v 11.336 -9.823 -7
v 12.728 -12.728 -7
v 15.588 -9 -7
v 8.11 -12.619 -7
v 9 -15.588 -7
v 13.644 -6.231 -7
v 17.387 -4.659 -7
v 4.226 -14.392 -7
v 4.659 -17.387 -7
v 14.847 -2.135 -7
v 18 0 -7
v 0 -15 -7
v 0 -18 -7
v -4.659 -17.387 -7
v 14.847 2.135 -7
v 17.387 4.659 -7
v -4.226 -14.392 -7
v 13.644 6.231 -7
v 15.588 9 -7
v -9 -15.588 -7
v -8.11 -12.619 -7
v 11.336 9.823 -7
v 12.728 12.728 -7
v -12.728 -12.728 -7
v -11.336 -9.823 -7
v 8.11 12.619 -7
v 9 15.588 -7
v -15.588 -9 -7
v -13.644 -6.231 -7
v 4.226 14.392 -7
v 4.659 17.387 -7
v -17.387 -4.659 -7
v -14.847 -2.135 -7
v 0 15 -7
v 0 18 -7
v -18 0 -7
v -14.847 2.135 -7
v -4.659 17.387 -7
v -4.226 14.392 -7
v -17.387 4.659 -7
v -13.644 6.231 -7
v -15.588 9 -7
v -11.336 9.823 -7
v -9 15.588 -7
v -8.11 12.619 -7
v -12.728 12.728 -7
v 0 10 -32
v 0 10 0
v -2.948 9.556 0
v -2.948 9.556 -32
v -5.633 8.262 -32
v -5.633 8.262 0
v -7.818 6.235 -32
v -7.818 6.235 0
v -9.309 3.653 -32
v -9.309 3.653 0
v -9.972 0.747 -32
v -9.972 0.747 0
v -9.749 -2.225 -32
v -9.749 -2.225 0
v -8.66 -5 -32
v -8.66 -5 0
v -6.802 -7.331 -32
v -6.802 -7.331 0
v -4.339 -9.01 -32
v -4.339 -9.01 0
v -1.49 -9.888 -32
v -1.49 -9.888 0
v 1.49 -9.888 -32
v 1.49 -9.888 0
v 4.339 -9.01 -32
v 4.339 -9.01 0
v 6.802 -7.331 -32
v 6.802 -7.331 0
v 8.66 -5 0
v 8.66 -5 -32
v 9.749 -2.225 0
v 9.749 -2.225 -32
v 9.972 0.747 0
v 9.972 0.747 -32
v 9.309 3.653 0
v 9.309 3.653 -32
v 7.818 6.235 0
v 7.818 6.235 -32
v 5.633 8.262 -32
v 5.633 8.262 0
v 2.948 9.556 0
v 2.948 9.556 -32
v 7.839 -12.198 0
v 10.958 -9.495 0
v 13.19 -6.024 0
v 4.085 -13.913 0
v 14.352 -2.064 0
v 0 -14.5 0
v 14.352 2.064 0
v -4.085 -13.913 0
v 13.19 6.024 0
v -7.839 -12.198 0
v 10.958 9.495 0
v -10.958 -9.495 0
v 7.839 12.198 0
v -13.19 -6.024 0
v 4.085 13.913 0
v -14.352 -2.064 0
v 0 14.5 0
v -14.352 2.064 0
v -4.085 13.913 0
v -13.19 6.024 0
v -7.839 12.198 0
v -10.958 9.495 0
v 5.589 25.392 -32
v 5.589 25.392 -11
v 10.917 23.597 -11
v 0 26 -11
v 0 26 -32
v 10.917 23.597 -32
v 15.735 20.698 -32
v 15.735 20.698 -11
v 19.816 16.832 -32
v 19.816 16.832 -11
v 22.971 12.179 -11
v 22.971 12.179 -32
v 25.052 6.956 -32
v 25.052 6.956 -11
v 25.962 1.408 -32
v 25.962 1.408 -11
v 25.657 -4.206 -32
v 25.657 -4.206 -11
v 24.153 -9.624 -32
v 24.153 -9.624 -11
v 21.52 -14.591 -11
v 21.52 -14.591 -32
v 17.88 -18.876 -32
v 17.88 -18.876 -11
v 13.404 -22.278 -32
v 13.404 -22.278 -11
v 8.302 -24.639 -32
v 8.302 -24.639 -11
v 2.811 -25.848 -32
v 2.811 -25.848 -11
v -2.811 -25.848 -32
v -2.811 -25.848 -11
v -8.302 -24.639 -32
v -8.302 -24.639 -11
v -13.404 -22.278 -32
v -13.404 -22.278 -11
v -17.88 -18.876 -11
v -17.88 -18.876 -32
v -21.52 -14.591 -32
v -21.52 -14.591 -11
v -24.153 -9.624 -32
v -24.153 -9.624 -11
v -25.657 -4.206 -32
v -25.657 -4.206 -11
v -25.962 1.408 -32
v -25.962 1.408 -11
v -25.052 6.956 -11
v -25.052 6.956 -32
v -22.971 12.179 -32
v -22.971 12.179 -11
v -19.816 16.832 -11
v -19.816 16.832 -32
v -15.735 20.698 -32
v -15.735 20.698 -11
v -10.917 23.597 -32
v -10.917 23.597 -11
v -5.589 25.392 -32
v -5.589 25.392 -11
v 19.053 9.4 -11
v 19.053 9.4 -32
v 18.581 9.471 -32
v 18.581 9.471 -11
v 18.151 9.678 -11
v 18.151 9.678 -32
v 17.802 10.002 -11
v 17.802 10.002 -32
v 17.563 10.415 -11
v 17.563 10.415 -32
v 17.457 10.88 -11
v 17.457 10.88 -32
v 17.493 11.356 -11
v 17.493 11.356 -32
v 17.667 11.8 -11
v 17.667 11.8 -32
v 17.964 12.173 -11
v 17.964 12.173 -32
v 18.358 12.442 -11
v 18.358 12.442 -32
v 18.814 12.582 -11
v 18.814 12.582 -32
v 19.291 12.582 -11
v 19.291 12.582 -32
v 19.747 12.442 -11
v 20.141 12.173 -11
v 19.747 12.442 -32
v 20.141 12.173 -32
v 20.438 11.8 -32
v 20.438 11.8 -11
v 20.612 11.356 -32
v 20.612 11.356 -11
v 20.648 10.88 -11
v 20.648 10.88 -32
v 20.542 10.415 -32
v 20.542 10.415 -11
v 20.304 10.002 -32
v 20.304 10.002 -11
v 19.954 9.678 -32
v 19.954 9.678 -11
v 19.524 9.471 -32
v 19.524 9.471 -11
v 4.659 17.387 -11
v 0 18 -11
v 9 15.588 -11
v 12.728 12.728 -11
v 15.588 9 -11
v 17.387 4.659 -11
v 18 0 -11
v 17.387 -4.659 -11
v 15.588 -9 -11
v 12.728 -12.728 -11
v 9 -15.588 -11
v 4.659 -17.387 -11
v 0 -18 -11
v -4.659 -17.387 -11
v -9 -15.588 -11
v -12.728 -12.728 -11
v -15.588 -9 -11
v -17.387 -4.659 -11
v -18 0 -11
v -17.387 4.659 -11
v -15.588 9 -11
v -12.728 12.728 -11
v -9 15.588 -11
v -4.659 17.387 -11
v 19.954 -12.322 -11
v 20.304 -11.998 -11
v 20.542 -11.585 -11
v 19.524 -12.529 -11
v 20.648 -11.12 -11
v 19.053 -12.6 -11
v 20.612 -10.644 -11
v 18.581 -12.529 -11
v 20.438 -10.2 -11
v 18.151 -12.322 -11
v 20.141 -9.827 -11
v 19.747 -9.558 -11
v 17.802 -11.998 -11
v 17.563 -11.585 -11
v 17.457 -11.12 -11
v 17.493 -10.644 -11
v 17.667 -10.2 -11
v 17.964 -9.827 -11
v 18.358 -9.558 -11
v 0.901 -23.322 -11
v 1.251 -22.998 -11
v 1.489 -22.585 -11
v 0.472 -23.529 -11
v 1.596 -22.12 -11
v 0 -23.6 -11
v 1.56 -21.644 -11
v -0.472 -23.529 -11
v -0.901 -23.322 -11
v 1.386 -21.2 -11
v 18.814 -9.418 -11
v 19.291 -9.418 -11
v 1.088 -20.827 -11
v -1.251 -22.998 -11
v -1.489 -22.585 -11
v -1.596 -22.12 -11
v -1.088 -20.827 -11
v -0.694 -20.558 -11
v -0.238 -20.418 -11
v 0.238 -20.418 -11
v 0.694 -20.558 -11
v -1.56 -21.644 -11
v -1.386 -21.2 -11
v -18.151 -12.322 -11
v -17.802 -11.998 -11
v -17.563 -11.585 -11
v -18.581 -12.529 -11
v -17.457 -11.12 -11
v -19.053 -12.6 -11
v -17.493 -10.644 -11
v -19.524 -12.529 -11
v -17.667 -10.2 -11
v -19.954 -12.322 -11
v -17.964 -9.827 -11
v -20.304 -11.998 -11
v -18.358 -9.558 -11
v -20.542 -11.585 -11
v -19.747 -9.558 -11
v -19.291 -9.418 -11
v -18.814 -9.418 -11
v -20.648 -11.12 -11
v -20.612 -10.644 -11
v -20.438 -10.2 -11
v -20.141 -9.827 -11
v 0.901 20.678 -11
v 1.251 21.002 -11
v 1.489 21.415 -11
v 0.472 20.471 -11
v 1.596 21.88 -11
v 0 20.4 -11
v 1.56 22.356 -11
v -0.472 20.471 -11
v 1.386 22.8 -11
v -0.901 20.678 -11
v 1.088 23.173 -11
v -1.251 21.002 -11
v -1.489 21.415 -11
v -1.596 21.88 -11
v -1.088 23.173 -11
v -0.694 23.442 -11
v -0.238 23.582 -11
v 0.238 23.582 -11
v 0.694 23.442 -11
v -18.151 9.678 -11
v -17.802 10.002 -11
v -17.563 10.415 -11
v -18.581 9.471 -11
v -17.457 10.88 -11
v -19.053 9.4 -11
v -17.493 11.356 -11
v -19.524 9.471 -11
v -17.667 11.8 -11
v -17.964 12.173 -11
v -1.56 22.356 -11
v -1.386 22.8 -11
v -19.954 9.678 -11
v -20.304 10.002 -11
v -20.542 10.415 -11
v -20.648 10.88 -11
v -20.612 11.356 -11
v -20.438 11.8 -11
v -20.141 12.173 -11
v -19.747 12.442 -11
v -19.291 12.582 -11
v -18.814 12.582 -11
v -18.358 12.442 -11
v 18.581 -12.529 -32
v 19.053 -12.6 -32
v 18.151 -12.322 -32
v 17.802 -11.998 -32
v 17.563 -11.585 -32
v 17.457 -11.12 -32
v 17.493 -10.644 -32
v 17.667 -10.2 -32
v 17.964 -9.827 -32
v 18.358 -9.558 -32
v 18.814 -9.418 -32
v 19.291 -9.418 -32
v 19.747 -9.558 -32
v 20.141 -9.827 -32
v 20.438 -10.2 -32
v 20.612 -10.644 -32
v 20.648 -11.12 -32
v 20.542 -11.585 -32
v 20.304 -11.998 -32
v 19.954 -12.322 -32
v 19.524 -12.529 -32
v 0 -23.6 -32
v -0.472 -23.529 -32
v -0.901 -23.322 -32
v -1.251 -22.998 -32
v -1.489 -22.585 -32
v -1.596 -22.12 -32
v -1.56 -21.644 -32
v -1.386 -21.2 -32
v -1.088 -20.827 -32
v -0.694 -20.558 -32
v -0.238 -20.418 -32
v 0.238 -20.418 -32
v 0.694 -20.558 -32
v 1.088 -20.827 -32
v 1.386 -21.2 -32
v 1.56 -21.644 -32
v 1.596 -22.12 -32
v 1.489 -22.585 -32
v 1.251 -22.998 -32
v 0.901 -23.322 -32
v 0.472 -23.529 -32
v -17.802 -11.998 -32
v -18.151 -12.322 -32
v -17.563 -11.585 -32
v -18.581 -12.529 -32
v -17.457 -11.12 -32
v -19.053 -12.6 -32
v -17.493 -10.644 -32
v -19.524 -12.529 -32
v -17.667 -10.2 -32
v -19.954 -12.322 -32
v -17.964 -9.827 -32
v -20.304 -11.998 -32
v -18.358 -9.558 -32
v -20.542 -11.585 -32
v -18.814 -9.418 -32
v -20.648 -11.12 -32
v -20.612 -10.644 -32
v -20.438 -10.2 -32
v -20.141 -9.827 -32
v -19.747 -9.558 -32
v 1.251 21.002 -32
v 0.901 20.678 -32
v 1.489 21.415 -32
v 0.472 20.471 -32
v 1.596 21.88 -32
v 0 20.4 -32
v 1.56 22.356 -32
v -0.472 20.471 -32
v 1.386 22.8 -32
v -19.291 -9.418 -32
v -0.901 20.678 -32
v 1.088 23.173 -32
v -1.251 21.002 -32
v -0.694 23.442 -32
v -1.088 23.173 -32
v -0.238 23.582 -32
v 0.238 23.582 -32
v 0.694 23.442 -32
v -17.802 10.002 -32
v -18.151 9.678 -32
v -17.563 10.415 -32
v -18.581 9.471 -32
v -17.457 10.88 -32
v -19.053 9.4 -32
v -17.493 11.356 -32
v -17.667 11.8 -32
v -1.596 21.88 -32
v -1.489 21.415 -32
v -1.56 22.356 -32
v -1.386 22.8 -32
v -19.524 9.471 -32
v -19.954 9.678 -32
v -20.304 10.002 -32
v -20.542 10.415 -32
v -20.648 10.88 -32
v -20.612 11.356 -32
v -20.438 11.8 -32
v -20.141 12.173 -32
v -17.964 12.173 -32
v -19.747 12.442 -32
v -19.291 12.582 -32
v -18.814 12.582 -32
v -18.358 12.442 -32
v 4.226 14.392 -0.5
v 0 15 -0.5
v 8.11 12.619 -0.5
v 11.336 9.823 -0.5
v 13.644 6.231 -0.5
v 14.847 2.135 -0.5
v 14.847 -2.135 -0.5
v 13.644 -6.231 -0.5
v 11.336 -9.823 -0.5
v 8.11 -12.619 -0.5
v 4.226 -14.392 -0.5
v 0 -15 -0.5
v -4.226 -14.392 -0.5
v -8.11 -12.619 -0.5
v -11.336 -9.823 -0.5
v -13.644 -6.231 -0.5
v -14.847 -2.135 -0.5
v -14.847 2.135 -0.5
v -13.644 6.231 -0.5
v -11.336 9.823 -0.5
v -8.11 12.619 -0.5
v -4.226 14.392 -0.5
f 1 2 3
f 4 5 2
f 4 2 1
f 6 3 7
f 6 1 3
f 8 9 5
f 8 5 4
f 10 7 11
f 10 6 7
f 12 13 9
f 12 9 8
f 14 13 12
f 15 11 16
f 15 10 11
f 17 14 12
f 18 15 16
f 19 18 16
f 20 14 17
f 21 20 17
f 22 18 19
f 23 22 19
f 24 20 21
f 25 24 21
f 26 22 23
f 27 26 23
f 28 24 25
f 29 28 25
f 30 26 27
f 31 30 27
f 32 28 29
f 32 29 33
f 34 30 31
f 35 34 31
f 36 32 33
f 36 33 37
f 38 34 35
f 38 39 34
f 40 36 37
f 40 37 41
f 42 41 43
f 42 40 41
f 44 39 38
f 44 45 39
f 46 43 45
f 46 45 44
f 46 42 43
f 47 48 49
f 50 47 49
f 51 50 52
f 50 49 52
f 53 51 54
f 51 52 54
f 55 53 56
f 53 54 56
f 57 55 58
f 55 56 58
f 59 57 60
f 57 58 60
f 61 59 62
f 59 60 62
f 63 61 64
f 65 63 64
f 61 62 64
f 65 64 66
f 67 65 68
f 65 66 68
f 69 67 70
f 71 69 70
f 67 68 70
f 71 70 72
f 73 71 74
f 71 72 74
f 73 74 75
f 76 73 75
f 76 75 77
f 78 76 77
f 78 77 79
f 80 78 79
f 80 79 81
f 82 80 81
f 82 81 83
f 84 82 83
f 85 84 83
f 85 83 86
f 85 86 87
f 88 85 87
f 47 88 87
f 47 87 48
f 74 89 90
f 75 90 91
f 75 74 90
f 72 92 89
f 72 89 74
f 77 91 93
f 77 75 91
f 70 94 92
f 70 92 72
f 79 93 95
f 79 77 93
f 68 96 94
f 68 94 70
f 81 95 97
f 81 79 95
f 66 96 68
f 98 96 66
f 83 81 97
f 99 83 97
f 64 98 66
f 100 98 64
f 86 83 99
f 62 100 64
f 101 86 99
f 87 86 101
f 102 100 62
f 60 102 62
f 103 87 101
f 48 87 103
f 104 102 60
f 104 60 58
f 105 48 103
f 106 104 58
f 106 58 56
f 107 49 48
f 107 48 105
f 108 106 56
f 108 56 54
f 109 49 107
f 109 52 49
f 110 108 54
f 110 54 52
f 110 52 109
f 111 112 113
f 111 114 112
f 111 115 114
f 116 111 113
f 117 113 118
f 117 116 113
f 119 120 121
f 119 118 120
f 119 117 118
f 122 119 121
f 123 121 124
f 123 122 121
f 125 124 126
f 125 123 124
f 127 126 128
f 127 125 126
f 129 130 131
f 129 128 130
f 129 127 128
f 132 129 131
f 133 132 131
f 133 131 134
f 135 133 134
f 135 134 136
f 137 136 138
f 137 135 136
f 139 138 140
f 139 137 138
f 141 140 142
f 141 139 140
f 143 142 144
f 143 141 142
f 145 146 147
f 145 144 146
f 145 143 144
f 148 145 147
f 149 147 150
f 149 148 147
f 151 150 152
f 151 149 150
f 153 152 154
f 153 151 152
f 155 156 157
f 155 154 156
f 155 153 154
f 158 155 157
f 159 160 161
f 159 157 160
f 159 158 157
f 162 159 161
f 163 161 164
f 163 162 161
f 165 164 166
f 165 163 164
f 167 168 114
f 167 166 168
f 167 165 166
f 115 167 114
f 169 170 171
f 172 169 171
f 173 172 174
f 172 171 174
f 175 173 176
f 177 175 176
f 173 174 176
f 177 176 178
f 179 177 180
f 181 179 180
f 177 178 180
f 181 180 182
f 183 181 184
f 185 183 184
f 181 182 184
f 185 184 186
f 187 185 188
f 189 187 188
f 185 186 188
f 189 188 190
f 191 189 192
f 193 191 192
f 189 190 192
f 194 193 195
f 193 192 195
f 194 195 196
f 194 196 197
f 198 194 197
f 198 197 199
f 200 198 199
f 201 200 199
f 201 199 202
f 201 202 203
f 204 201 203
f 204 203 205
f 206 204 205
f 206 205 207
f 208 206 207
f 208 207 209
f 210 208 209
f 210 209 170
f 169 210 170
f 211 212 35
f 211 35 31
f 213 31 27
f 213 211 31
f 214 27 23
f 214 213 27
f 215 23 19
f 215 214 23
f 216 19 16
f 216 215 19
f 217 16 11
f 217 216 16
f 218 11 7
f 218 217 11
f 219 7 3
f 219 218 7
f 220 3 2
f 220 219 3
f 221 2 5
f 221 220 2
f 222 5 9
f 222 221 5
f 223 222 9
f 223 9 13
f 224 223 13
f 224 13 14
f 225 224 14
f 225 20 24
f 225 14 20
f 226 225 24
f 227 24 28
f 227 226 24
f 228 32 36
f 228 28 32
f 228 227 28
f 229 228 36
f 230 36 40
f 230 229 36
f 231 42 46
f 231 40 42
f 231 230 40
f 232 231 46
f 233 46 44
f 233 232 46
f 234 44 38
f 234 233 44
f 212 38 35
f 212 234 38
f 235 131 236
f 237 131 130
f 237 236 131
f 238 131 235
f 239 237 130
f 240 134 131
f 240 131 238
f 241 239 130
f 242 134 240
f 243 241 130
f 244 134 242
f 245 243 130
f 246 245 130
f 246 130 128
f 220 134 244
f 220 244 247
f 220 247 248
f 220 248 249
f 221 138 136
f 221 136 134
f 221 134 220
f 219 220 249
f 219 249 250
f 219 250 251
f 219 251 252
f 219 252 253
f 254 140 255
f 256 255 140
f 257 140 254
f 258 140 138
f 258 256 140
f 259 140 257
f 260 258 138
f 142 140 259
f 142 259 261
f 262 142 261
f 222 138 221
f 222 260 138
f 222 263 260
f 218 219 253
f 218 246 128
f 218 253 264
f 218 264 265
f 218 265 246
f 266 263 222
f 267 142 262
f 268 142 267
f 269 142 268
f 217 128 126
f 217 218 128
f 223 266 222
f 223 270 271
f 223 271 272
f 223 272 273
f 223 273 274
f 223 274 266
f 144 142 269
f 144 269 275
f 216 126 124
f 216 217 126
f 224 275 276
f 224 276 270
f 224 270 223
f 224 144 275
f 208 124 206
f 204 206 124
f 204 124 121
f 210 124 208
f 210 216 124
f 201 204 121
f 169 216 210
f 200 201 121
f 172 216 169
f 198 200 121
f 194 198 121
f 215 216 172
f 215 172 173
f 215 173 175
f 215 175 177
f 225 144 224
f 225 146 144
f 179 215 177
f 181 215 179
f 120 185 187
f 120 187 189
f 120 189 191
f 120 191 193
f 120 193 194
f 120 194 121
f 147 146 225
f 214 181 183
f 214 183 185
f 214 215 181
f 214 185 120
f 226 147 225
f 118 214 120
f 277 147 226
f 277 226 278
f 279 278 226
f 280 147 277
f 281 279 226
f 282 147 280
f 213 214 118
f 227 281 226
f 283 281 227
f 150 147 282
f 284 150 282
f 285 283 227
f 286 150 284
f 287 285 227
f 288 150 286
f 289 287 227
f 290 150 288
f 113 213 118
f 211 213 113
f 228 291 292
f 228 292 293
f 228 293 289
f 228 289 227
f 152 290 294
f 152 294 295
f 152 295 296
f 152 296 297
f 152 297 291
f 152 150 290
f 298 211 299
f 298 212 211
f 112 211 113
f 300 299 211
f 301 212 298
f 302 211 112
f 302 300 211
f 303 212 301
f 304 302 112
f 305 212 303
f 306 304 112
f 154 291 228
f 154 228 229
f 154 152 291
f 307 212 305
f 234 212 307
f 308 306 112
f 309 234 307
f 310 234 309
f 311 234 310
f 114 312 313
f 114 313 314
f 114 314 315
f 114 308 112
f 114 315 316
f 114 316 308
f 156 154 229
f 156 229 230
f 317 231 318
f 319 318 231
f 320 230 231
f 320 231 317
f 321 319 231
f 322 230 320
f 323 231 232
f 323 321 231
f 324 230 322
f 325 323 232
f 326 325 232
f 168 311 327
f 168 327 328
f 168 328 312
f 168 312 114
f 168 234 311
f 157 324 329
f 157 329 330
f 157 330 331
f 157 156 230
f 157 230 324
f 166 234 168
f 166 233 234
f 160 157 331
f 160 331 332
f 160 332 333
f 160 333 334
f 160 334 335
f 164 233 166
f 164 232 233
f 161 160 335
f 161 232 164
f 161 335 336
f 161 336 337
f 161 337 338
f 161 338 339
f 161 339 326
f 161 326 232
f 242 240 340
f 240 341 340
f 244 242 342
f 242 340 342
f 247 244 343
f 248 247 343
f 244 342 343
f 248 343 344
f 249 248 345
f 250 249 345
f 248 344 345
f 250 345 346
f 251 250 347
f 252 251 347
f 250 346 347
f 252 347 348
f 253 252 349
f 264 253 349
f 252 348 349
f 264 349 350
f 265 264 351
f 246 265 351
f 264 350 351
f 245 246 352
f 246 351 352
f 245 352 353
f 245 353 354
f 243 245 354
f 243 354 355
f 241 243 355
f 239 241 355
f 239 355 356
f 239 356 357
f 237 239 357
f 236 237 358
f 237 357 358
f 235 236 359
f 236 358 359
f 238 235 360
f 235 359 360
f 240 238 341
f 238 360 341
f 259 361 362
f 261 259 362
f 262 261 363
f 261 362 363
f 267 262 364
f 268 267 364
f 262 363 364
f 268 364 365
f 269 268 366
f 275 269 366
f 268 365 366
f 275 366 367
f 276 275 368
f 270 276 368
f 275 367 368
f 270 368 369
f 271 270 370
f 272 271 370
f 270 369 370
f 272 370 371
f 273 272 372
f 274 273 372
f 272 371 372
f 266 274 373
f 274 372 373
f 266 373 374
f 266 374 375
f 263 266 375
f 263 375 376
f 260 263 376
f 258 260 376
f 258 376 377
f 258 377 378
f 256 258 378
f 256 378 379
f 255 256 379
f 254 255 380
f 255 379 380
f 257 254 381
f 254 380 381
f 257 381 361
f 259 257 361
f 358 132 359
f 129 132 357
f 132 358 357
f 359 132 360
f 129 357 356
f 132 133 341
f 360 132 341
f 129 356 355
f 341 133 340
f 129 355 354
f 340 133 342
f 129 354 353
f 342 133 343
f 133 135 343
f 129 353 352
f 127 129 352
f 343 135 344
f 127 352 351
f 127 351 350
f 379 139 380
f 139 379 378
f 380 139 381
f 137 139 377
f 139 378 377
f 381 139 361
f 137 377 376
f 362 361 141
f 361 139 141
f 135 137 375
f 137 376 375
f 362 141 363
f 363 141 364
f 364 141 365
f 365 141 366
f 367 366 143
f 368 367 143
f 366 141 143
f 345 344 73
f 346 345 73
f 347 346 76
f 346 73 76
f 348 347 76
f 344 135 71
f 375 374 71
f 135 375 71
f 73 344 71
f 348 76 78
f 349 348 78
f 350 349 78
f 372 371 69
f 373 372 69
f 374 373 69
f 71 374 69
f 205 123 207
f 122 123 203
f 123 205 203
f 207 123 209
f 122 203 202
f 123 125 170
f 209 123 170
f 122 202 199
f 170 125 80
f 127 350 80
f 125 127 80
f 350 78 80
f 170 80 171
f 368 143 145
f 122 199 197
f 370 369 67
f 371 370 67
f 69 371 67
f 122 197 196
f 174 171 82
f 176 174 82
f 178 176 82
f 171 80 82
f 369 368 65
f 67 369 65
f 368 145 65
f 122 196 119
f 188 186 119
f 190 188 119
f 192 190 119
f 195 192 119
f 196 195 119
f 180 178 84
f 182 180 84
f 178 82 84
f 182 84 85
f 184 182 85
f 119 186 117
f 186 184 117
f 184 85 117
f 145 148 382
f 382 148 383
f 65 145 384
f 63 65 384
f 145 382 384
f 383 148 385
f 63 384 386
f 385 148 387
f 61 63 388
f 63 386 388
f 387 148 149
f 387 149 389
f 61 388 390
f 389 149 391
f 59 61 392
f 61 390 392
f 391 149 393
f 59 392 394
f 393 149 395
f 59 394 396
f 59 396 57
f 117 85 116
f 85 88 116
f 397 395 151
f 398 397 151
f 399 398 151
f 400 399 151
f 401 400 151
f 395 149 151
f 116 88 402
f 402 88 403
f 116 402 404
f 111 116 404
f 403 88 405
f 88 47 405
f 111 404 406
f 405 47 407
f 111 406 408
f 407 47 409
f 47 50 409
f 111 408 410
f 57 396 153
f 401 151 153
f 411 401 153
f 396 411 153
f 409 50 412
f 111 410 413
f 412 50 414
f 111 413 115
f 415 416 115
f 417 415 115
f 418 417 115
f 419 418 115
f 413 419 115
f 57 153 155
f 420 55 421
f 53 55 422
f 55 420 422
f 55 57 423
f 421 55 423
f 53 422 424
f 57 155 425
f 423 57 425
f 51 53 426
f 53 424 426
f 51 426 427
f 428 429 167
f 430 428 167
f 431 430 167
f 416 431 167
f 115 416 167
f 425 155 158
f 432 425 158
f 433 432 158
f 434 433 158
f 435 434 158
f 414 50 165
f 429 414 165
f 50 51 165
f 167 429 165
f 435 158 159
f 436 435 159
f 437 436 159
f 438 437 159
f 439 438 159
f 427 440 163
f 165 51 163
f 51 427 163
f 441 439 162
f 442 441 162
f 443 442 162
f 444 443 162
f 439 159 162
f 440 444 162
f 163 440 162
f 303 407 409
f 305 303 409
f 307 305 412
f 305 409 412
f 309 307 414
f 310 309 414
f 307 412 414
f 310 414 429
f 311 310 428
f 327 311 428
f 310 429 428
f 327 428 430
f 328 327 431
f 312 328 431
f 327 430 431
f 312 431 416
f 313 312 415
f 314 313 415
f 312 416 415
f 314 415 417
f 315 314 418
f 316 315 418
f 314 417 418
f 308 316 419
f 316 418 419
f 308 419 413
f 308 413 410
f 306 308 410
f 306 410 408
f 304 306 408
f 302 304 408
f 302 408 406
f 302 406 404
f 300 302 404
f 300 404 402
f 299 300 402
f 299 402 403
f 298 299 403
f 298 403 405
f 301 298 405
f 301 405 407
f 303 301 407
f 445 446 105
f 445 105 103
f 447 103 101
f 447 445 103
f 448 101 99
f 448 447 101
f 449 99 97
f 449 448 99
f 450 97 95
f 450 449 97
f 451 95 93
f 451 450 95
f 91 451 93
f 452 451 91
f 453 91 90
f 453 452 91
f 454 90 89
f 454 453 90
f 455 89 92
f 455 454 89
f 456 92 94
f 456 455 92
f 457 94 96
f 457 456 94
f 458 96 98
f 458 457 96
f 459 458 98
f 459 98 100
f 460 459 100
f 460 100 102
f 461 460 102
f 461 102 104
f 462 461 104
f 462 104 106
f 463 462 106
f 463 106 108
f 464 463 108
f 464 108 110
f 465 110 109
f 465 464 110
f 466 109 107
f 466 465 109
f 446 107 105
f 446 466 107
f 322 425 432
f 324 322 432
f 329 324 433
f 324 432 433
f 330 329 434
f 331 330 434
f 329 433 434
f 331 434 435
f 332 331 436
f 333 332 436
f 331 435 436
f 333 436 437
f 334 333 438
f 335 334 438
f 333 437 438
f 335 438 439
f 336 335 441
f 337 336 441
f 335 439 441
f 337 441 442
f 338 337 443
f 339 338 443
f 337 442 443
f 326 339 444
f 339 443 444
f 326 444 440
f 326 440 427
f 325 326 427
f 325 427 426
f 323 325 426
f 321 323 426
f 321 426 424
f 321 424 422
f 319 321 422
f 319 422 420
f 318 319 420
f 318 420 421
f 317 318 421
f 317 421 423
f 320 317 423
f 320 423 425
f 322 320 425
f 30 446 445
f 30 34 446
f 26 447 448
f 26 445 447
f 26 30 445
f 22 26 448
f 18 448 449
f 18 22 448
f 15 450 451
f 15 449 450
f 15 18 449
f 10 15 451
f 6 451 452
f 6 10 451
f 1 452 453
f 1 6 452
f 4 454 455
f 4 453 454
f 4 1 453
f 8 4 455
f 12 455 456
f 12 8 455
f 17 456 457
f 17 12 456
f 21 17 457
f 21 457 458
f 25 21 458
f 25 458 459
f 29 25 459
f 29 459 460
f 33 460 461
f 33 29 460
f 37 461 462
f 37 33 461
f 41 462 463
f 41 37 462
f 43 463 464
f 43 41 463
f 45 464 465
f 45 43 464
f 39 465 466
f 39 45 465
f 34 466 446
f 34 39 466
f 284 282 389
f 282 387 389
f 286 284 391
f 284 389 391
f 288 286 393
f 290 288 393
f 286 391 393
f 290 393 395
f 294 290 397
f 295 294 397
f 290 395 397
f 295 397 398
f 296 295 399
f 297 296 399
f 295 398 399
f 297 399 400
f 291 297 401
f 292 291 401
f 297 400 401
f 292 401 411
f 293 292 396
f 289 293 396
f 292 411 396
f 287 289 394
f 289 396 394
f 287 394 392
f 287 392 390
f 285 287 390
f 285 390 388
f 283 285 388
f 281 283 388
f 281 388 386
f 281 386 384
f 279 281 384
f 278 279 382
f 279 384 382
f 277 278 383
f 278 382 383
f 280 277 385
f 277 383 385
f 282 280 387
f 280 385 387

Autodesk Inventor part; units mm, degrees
ref_plane "YZ Plane" through (0, 0, 0) normal (1, 0, 0) x (0, 1, 0)
ref_plane "XZ Plane" through (0, 0, 0) normal (0, 1, 0) x (-1, 0, 0)
ref_plane "XY Plane" through (0, 0, 0) normal (0, 0, 1) x (1, 0, 0)
sketch "スケッチ1" plane through (0, 0, 0) normal (1, 0, 0) x (0, 1, 0)
  line L0 (15, 0) -> (15, -7)
  line L1 (15, -7) -> (18, -7)
  line L2 (26, -32) -> (10, -32)
  line L3 (10, -32) -> (10, 0)
  line L4 (10, 0) -> (15, 0)
  line L5 (0, -38.4) -> (0, 6.4) projected
  line L6 (18, -7) -> (18, -11)
  line L7 (18, -11) -> (26, -11)
  line L8 (26, -11) -> (26, -32)
  point P0 (0, 0)
  dimension "d0" = 10
  dimension "d1" = 15
  dimension "d2" = 7
  dimension "d3" = 3
  dimension "d10" = 25
  dimension "d11" = 4
  dimension "d12" = 8
revolve "回転1" add sketch "スケッチ1" angle 360 about axis through (0, 0, -10) along (0, 0, 1)
chamfer "面取り1" distance 0.5 angle 45 1 edges at (0, -15, 0)
sketch "スケッチ2" plane through (0, 0, -11) normal (0, 0, 1) x (1, 0, 0)
  circle A0 centre (0, 0) radius 26 projected
  circle A1 centre (0, 0) radius 22
  point P0 (0, 22)
  point P1 (-19.0526, 11)
  point P2 (-19.0526, -11)
  point P3 (0, -22)
  point P4 (19.0526, -11)
  point P5 (19.0526, 11)
  dimension "d13" = 4
  dimension "d16" = 360
hole "穴1" at (0, 22, -11) at (-19.0526, 11, -11) at (-19.0526, -11, -11) at (0, -22, -11) at (19.0526, -11, -11) at (19.0526, 11, -11) direction (0, 0, -1) diameter 3.2 end through all clearance for "Socket Head Cap Screw" size "M3" standard "Ansi Metric M Profile"
properties part number "base6" material "ABS プラスチック"
